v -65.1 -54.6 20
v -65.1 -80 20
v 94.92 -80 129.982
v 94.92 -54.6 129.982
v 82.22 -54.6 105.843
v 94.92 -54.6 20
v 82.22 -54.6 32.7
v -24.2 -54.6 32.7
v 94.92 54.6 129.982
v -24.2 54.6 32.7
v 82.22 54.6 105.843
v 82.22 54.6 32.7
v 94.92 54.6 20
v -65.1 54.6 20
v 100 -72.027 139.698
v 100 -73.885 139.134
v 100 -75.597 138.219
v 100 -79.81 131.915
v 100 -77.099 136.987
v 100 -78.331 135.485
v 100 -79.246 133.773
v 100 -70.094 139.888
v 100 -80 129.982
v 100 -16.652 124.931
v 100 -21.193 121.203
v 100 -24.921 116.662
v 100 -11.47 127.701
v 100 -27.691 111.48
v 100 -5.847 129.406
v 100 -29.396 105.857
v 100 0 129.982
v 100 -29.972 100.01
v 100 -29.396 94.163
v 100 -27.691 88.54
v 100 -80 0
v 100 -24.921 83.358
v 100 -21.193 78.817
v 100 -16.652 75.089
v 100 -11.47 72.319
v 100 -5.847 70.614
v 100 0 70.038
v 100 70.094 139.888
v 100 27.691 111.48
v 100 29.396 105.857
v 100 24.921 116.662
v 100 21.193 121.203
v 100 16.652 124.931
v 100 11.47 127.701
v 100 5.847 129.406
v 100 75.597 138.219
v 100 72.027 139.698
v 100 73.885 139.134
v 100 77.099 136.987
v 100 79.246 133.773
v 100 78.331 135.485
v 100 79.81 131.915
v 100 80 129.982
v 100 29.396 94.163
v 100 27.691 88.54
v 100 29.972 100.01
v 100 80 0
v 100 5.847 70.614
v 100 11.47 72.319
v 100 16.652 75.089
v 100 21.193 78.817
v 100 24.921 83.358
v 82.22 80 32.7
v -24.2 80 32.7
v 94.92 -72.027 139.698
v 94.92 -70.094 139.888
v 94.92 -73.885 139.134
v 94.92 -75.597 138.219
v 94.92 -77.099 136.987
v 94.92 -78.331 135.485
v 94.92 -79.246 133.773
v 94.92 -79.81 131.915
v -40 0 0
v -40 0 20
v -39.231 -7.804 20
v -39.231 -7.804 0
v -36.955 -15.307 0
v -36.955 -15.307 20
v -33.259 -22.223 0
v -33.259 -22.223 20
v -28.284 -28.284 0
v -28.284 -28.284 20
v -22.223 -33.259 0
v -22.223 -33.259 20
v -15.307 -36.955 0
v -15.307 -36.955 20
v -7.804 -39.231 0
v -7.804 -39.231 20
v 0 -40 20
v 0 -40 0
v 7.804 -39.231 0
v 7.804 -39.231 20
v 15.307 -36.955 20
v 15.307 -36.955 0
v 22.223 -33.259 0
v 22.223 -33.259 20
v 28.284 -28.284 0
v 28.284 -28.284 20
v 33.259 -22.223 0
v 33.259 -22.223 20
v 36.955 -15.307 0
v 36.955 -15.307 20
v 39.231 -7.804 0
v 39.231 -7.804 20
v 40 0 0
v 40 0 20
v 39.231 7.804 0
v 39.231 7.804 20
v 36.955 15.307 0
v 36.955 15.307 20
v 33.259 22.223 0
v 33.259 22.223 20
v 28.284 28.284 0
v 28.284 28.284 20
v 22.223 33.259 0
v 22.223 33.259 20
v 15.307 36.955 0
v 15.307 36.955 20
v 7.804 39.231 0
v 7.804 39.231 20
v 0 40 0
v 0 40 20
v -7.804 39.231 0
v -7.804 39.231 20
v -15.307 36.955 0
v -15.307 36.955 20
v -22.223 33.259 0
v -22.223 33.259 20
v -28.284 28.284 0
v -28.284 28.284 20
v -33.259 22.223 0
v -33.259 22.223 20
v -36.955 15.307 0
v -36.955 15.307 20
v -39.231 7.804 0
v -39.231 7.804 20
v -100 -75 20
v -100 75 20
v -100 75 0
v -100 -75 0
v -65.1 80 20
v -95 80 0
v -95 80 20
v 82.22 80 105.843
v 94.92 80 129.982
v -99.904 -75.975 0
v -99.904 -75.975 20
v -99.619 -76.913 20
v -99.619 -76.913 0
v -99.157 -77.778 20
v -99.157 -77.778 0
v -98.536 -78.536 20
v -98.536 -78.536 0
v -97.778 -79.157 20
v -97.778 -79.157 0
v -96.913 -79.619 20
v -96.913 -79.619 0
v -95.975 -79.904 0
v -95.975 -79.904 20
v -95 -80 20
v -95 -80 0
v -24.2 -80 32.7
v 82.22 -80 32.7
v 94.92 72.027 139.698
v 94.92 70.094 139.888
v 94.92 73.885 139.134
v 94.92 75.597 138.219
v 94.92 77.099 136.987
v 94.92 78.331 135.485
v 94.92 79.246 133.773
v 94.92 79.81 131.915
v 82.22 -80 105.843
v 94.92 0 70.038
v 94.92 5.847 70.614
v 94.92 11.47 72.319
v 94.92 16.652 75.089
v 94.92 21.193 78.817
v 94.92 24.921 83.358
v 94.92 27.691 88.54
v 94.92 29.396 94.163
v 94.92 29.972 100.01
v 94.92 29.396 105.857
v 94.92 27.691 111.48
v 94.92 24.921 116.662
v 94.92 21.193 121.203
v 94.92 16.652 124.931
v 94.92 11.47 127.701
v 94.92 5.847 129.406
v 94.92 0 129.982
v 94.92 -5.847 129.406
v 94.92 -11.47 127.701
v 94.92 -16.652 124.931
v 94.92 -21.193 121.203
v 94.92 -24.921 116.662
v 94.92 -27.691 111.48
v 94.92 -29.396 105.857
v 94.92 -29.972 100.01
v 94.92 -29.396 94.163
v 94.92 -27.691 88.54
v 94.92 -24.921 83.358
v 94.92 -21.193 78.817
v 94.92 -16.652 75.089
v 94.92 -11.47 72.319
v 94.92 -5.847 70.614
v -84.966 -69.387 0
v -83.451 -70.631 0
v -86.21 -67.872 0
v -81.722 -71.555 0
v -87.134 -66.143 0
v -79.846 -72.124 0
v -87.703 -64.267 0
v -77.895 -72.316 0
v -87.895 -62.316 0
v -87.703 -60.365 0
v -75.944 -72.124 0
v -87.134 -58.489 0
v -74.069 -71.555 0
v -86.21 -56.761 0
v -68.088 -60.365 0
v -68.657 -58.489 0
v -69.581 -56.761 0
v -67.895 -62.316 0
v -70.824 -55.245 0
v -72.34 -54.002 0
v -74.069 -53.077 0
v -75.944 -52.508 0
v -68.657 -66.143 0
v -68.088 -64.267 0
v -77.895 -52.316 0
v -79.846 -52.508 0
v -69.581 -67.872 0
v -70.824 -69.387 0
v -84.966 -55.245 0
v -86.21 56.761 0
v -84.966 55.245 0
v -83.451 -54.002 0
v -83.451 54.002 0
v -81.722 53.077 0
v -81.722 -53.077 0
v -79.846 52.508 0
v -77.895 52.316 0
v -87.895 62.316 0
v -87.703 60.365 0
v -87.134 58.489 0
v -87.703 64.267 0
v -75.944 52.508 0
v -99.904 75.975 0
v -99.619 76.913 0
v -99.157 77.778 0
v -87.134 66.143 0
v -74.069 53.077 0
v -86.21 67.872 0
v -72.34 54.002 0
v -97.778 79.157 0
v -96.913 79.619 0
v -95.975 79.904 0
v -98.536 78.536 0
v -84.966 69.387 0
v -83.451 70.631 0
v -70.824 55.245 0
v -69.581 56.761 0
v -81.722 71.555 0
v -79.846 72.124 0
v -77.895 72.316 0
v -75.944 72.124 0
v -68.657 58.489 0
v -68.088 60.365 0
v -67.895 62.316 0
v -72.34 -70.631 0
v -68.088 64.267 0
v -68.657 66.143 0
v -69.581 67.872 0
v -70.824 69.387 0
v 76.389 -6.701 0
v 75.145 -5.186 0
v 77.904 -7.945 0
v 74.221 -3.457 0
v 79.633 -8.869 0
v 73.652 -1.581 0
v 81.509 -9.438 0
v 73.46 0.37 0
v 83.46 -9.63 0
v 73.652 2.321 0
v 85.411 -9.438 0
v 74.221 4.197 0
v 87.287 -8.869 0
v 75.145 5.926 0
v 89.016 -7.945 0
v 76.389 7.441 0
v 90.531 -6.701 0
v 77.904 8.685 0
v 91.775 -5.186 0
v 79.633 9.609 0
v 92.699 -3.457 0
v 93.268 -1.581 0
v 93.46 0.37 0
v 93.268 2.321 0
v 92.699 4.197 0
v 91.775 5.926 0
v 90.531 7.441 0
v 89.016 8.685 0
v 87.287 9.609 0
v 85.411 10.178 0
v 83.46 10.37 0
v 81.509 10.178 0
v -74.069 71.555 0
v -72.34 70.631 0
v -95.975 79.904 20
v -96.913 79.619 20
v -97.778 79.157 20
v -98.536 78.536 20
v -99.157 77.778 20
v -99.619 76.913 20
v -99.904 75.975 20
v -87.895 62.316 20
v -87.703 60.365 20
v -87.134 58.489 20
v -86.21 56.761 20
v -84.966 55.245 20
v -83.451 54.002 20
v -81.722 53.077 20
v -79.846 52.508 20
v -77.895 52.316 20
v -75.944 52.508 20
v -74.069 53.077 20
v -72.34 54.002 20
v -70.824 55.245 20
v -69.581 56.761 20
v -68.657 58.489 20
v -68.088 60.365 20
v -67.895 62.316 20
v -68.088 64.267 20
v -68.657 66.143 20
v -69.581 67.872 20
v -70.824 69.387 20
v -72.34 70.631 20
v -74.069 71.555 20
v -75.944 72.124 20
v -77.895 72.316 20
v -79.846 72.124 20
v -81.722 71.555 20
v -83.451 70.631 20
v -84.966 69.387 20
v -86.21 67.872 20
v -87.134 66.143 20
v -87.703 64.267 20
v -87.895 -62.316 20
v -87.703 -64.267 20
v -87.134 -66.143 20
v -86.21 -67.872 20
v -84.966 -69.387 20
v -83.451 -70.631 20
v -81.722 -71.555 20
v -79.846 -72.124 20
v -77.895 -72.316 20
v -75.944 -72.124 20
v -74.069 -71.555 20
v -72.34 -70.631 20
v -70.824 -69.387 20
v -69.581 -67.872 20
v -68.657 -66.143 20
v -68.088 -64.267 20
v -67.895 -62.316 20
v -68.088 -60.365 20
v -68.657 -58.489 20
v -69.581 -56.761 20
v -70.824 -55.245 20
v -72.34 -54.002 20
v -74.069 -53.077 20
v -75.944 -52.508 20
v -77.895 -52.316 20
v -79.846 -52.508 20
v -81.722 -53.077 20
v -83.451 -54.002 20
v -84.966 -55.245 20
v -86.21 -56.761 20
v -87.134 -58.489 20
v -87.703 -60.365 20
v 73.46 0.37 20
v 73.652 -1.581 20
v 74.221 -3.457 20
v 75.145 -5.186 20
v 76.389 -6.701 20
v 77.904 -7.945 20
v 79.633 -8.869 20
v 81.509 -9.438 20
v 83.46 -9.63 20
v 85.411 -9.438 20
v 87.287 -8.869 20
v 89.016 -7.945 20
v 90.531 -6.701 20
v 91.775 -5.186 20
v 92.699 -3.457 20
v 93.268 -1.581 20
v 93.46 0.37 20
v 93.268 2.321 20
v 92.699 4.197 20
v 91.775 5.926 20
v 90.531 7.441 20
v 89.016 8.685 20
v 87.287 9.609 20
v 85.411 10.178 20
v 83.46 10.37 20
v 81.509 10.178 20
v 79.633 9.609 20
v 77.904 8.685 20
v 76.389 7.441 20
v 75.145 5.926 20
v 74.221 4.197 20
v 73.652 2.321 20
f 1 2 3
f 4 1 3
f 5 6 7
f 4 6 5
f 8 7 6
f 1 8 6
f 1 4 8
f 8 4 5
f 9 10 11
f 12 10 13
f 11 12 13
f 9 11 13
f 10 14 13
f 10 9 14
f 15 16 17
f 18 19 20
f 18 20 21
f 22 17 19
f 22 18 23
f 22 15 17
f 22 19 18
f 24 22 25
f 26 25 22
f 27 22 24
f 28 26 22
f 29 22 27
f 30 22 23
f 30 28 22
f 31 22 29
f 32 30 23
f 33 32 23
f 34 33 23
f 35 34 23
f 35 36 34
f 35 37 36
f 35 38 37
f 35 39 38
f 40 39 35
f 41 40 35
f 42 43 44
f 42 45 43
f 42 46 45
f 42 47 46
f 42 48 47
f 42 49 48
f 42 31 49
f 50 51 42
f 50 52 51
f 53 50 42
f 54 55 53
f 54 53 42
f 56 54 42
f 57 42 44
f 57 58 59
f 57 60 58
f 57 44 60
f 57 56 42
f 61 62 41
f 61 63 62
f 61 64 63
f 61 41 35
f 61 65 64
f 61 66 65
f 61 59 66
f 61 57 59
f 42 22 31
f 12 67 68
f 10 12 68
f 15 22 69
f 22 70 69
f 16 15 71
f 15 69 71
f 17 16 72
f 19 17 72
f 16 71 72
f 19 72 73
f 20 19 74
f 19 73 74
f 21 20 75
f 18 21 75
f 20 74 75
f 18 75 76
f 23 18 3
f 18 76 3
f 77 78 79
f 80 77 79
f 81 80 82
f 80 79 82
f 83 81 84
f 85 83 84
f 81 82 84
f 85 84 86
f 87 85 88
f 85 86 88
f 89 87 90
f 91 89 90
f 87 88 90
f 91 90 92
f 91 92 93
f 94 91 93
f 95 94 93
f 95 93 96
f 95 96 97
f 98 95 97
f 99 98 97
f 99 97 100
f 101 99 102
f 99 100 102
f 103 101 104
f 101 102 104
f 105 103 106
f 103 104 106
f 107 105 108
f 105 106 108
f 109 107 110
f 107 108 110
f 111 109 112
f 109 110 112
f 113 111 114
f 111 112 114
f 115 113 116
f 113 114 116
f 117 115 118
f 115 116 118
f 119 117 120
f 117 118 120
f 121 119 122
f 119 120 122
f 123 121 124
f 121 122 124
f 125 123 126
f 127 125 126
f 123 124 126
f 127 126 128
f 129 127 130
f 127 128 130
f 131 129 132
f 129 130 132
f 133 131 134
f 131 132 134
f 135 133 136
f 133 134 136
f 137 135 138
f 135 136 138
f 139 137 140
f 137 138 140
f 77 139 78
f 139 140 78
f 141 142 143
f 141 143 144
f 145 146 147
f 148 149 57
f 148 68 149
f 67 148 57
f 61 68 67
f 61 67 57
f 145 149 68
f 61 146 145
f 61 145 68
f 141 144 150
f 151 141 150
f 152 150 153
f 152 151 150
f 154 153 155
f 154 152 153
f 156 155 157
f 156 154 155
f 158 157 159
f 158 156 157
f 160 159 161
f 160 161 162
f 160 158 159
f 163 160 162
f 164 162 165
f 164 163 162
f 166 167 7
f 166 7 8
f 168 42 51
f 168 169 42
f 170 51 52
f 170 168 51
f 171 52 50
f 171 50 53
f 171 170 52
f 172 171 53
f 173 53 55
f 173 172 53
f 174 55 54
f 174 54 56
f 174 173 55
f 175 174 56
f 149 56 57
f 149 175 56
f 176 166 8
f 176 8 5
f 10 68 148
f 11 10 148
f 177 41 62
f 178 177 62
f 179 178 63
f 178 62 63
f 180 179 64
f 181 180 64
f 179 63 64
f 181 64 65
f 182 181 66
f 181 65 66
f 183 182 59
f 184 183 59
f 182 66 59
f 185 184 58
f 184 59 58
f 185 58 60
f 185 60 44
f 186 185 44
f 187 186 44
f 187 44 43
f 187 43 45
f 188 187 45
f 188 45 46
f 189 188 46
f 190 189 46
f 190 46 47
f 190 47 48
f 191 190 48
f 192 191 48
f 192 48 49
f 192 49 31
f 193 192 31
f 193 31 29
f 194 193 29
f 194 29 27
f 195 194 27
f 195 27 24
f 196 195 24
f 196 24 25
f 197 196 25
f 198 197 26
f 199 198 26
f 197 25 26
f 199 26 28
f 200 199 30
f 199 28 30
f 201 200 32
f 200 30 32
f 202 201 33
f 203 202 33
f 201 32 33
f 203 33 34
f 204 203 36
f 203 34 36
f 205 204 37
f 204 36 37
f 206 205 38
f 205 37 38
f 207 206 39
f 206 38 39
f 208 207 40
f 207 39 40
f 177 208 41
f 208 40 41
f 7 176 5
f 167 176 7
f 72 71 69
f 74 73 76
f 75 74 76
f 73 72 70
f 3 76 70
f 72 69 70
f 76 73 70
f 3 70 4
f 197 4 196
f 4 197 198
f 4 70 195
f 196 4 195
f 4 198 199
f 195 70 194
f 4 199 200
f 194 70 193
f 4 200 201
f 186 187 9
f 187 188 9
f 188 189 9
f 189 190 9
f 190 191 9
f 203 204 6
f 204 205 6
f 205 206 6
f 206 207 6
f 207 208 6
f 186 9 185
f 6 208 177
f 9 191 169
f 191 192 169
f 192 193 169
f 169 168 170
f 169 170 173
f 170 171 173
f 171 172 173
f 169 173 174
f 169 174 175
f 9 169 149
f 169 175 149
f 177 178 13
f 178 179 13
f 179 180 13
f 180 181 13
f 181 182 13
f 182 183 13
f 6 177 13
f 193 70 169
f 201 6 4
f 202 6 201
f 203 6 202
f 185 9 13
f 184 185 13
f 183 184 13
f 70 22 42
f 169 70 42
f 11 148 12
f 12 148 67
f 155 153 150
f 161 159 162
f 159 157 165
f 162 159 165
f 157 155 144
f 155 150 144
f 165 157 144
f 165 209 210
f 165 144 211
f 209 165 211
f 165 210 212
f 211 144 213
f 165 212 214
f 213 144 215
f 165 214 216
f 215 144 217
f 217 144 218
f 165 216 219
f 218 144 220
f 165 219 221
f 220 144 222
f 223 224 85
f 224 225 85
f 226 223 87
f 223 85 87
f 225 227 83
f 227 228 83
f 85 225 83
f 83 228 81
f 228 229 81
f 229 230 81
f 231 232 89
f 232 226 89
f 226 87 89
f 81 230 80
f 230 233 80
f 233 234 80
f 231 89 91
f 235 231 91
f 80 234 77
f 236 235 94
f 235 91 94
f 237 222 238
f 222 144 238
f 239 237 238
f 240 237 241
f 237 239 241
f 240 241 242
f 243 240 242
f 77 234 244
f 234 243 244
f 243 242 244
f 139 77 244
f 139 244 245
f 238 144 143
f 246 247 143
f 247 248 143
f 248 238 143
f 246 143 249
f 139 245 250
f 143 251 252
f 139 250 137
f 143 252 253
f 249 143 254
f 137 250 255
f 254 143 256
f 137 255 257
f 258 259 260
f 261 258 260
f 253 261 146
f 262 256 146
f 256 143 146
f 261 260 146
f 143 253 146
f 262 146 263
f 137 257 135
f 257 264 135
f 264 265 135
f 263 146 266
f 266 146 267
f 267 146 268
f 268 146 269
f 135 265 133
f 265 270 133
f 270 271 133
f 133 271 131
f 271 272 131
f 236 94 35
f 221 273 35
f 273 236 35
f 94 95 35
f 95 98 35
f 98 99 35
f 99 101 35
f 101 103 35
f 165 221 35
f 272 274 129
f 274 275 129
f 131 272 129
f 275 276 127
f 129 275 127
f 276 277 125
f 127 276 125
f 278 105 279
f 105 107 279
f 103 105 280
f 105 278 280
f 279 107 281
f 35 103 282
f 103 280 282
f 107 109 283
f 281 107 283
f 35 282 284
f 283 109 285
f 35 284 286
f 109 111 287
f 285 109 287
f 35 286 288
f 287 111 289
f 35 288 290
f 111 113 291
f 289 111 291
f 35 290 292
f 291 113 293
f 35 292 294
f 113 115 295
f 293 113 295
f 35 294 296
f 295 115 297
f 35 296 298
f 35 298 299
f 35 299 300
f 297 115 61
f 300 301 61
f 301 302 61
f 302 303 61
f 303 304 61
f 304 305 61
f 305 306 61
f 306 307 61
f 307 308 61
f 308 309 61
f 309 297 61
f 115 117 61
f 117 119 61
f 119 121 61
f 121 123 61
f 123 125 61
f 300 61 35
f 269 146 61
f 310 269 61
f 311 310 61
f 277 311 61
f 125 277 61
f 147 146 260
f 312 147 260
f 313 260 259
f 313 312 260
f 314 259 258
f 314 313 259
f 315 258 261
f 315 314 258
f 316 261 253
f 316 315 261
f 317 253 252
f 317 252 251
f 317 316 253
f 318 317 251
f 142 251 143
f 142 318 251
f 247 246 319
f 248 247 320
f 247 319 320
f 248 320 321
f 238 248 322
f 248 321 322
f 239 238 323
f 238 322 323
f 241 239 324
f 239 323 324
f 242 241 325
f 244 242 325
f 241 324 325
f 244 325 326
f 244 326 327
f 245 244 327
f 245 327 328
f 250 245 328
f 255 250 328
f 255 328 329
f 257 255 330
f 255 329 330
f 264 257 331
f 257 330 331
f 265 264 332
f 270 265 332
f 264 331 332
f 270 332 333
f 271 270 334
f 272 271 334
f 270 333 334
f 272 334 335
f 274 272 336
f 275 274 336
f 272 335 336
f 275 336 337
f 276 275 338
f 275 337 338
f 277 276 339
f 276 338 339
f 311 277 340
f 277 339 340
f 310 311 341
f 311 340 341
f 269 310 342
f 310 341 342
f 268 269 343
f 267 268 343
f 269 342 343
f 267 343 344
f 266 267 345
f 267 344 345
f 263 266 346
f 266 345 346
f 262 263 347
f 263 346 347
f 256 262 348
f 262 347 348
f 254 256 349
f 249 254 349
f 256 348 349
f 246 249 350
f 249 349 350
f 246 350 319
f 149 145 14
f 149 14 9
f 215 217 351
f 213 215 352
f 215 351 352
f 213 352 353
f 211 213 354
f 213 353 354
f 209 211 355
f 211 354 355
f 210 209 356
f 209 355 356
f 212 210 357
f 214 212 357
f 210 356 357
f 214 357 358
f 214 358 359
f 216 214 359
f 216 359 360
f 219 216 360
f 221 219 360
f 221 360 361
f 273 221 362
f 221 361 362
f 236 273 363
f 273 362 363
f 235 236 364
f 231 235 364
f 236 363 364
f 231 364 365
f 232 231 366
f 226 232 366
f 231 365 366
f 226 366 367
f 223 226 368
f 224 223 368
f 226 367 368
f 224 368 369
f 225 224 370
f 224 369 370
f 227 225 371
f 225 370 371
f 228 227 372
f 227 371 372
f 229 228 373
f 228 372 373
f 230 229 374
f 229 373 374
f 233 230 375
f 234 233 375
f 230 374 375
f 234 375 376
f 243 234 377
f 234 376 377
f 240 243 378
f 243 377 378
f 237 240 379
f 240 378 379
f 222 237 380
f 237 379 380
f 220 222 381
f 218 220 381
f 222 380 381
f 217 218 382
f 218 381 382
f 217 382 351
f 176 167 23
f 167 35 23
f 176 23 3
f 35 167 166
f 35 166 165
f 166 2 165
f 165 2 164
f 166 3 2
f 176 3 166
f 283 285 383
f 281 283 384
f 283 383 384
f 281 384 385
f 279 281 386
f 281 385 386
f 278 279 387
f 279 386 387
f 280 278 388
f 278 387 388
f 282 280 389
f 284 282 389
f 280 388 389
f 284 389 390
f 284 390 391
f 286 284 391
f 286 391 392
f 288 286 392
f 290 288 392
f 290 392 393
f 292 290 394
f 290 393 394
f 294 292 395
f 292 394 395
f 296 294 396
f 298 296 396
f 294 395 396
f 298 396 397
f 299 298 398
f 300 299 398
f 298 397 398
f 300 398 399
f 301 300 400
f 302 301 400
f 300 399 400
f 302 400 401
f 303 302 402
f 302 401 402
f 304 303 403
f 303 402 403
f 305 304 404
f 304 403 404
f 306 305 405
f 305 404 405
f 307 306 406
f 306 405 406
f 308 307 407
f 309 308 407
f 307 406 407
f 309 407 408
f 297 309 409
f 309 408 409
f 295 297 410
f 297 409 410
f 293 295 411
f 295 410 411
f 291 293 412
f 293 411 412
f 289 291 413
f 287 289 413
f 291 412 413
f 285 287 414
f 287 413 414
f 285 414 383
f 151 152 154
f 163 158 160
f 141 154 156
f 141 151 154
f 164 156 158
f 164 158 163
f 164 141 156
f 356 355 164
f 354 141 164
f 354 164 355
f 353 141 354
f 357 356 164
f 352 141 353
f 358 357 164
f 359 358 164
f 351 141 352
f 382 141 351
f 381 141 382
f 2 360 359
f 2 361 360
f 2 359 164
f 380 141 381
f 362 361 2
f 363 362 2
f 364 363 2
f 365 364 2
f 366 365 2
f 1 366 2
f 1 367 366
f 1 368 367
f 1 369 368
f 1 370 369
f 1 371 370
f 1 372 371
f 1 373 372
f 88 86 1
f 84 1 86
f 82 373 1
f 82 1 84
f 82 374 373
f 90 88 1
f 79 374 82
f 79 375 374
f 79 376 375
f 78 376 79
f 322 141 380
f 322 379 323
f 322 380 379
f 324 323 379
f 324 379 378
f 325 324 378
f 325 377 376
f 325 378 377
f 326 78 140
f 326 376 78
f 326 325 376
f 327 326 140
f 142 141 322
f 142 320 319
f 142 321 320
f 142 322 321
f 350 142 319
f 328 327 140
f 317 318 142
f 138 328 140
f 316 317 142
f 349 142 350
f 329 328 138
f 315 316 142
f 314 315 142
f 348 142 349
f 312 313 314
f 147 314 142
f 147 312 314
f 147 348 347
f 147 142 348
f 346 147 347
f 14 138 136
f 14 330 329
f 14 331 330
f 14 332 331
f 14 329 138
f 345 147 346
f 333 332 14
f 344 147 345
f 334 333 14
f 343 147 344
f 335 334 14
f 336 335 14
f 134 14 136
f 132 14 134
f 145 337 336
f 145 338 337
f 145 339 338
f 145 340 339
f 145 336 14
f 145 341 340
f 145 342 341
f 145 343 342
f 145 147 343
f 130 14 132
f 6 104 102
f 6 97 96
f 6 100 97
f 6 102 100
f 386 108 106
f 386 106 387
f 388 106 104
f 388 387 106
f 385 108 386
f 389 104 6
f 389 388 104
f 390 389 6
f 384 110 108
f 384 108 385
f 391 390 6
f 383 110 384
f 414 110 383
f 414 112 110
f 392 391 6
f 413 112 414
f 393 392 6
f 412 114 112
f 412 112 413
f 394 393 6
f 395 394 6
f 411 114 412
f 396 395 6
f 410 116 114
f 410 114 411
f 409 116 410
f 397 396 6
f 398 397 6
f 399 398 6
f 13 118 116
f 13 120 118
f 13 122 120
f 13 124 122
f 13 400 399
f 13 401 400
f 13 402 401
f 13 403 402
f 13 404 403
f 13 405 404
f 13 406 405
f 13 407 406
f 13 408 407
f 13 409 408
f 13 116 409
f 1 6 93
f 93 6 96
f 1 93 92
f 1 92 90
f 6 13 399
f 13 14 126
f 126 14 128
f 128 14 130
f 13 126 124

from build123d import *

# Parameters (mm, degrees)
SKETCH1_R           = 10
SKETCH1_R_2         = 40
BOSS_EXTRUDE1_DEPTH = 20
SKETCH2_W           = 119.888
SKETCH2_H           = 160
BOSS_EXTRUDE3_DEPTH = 5.08
SKETCH2_7_R         = 29.972
CUT_EXTRUDE1_DEPTH  = 257.843634424
FILLET1_R           = 9.906
FILLET2_R           = 9.906
BOSS_EXTRUDE4_DEPTH = 25.4
BOSS_EXTRUDE5_DEPTH = 25.4


with BuildPart() as part:
    # Sketch1 → Boss-Extrude1 (new body)
    with BuildSketch(Plane.XY.offset(20)):
        with BuildLine():
            Line((95, 80), (-95, 80))
            ThreePointArc((-95, 80), (-98.535533906, 78.535533906), (-100, 75))
            Line((-100, 75), (-100, -75))
            ThreePointArc((-100, -75), (-98.535533906, -78.535533906), (-95, -80))
            Line((-95, -80), (95, -80))
            Line((95, -80), (100, -80))
            Line((100, -80), (100, -75))
            Line((100, -75), (100, 75))
            Line((100, 75), (100, 80))
            Line((100, 80), (95, 80))
        make_face()
        with Locations((-77.895356155, 62.316284924)):
            Circle(SKETCH1_R, mode=Mode.SUBTRACT)
        with Locations((83.46, 0.37)):
            Circle(SKETCH1_R, mode=Mode.SUBTRACT)
        with Locations((-77.895356155, -62.316284924)):
            Circle(SKETCH1_R, mode=Mode.SUBTRACT)
        Circle(SKETCH1_R_2, mode=Mode.SUBTRACT)
    extrude(amount=-BOSS_EXTRUDE1_DEPTH)

    # Sketch2 → Boss-Extrude3 (add)
    with BuildSketch(Plane(origin=(100, 0, 0), x_dir=(0, 0, -1), z_dir=(1, 0, 0))):
        with Locations((-79.944, 0)):
            Rectangle(SKETCH2_W, SKETCH2_H)
    extrude(amount=-BOSS_EXTRUDE3_DEPTH)

    # Sketch2<7> → Cut-Extrude1 (cut, through all)
    with BuildSketch(Plane(origin=(100, 0, 0), x_dir=(0, 0, -1), z_dir=(1, 0, 0))):
        with Locations((-100.01, 0)):
            Circle(SKETCH2_7_R)
    extrude(amount=-CUT_EXTRUDE1_DEPTH, mode=Mode.SUBTRACT)

    # Fillet1
    fillet1_edges = [part.edges().sort_by_distance(p)[0] for p in [
        (97.46, 80, 139.888),
    ]]
    fillet(fillet1_edges, radius=FILLET1_R)

    # Fillet2
    fillet2_edges = [part.edges().sort_by_distance(p)[0] for p in [
        (97.46, -80, 139.888),
    ]]
    fillet(fillet2_edges, radius=FILLET2_R)

    # Sketch4 → Boss-Extrude4 (add)
    with BuildSketch(Plane.XZ.offset(80)):
        Polygon((94.92, 129.982), (94.92, 20), (-65.1, 20), align=None)
        Polygon((82.22, 32.7), (-24.200327544, 32.7), (82.22, 105.842860042), align=None, mode=Mode.SUBTRACT)
    extrude(amount=-BOSS_EXTRUDE4_DEPTH)

    # Sketch5 → Boss-Extrude5 (add)
    with BuildSketch(Plane(origin=(0, 80, 0), x_dir=(1, 0, 0), z_dir=(0, 1, 0))):
        Polygon((94.92, -129.982), (94.92, -20), (-65.1, -20), align=None)
        Polygon((-24.200327544, -32.7), (82.22, -105.842860042), (82.22, -32.7), align=None, mode=Mode.SUBTRACT)
    extrude(amount=-BOSS_EXTRUDE5_DEPTH)


solid = part.part
